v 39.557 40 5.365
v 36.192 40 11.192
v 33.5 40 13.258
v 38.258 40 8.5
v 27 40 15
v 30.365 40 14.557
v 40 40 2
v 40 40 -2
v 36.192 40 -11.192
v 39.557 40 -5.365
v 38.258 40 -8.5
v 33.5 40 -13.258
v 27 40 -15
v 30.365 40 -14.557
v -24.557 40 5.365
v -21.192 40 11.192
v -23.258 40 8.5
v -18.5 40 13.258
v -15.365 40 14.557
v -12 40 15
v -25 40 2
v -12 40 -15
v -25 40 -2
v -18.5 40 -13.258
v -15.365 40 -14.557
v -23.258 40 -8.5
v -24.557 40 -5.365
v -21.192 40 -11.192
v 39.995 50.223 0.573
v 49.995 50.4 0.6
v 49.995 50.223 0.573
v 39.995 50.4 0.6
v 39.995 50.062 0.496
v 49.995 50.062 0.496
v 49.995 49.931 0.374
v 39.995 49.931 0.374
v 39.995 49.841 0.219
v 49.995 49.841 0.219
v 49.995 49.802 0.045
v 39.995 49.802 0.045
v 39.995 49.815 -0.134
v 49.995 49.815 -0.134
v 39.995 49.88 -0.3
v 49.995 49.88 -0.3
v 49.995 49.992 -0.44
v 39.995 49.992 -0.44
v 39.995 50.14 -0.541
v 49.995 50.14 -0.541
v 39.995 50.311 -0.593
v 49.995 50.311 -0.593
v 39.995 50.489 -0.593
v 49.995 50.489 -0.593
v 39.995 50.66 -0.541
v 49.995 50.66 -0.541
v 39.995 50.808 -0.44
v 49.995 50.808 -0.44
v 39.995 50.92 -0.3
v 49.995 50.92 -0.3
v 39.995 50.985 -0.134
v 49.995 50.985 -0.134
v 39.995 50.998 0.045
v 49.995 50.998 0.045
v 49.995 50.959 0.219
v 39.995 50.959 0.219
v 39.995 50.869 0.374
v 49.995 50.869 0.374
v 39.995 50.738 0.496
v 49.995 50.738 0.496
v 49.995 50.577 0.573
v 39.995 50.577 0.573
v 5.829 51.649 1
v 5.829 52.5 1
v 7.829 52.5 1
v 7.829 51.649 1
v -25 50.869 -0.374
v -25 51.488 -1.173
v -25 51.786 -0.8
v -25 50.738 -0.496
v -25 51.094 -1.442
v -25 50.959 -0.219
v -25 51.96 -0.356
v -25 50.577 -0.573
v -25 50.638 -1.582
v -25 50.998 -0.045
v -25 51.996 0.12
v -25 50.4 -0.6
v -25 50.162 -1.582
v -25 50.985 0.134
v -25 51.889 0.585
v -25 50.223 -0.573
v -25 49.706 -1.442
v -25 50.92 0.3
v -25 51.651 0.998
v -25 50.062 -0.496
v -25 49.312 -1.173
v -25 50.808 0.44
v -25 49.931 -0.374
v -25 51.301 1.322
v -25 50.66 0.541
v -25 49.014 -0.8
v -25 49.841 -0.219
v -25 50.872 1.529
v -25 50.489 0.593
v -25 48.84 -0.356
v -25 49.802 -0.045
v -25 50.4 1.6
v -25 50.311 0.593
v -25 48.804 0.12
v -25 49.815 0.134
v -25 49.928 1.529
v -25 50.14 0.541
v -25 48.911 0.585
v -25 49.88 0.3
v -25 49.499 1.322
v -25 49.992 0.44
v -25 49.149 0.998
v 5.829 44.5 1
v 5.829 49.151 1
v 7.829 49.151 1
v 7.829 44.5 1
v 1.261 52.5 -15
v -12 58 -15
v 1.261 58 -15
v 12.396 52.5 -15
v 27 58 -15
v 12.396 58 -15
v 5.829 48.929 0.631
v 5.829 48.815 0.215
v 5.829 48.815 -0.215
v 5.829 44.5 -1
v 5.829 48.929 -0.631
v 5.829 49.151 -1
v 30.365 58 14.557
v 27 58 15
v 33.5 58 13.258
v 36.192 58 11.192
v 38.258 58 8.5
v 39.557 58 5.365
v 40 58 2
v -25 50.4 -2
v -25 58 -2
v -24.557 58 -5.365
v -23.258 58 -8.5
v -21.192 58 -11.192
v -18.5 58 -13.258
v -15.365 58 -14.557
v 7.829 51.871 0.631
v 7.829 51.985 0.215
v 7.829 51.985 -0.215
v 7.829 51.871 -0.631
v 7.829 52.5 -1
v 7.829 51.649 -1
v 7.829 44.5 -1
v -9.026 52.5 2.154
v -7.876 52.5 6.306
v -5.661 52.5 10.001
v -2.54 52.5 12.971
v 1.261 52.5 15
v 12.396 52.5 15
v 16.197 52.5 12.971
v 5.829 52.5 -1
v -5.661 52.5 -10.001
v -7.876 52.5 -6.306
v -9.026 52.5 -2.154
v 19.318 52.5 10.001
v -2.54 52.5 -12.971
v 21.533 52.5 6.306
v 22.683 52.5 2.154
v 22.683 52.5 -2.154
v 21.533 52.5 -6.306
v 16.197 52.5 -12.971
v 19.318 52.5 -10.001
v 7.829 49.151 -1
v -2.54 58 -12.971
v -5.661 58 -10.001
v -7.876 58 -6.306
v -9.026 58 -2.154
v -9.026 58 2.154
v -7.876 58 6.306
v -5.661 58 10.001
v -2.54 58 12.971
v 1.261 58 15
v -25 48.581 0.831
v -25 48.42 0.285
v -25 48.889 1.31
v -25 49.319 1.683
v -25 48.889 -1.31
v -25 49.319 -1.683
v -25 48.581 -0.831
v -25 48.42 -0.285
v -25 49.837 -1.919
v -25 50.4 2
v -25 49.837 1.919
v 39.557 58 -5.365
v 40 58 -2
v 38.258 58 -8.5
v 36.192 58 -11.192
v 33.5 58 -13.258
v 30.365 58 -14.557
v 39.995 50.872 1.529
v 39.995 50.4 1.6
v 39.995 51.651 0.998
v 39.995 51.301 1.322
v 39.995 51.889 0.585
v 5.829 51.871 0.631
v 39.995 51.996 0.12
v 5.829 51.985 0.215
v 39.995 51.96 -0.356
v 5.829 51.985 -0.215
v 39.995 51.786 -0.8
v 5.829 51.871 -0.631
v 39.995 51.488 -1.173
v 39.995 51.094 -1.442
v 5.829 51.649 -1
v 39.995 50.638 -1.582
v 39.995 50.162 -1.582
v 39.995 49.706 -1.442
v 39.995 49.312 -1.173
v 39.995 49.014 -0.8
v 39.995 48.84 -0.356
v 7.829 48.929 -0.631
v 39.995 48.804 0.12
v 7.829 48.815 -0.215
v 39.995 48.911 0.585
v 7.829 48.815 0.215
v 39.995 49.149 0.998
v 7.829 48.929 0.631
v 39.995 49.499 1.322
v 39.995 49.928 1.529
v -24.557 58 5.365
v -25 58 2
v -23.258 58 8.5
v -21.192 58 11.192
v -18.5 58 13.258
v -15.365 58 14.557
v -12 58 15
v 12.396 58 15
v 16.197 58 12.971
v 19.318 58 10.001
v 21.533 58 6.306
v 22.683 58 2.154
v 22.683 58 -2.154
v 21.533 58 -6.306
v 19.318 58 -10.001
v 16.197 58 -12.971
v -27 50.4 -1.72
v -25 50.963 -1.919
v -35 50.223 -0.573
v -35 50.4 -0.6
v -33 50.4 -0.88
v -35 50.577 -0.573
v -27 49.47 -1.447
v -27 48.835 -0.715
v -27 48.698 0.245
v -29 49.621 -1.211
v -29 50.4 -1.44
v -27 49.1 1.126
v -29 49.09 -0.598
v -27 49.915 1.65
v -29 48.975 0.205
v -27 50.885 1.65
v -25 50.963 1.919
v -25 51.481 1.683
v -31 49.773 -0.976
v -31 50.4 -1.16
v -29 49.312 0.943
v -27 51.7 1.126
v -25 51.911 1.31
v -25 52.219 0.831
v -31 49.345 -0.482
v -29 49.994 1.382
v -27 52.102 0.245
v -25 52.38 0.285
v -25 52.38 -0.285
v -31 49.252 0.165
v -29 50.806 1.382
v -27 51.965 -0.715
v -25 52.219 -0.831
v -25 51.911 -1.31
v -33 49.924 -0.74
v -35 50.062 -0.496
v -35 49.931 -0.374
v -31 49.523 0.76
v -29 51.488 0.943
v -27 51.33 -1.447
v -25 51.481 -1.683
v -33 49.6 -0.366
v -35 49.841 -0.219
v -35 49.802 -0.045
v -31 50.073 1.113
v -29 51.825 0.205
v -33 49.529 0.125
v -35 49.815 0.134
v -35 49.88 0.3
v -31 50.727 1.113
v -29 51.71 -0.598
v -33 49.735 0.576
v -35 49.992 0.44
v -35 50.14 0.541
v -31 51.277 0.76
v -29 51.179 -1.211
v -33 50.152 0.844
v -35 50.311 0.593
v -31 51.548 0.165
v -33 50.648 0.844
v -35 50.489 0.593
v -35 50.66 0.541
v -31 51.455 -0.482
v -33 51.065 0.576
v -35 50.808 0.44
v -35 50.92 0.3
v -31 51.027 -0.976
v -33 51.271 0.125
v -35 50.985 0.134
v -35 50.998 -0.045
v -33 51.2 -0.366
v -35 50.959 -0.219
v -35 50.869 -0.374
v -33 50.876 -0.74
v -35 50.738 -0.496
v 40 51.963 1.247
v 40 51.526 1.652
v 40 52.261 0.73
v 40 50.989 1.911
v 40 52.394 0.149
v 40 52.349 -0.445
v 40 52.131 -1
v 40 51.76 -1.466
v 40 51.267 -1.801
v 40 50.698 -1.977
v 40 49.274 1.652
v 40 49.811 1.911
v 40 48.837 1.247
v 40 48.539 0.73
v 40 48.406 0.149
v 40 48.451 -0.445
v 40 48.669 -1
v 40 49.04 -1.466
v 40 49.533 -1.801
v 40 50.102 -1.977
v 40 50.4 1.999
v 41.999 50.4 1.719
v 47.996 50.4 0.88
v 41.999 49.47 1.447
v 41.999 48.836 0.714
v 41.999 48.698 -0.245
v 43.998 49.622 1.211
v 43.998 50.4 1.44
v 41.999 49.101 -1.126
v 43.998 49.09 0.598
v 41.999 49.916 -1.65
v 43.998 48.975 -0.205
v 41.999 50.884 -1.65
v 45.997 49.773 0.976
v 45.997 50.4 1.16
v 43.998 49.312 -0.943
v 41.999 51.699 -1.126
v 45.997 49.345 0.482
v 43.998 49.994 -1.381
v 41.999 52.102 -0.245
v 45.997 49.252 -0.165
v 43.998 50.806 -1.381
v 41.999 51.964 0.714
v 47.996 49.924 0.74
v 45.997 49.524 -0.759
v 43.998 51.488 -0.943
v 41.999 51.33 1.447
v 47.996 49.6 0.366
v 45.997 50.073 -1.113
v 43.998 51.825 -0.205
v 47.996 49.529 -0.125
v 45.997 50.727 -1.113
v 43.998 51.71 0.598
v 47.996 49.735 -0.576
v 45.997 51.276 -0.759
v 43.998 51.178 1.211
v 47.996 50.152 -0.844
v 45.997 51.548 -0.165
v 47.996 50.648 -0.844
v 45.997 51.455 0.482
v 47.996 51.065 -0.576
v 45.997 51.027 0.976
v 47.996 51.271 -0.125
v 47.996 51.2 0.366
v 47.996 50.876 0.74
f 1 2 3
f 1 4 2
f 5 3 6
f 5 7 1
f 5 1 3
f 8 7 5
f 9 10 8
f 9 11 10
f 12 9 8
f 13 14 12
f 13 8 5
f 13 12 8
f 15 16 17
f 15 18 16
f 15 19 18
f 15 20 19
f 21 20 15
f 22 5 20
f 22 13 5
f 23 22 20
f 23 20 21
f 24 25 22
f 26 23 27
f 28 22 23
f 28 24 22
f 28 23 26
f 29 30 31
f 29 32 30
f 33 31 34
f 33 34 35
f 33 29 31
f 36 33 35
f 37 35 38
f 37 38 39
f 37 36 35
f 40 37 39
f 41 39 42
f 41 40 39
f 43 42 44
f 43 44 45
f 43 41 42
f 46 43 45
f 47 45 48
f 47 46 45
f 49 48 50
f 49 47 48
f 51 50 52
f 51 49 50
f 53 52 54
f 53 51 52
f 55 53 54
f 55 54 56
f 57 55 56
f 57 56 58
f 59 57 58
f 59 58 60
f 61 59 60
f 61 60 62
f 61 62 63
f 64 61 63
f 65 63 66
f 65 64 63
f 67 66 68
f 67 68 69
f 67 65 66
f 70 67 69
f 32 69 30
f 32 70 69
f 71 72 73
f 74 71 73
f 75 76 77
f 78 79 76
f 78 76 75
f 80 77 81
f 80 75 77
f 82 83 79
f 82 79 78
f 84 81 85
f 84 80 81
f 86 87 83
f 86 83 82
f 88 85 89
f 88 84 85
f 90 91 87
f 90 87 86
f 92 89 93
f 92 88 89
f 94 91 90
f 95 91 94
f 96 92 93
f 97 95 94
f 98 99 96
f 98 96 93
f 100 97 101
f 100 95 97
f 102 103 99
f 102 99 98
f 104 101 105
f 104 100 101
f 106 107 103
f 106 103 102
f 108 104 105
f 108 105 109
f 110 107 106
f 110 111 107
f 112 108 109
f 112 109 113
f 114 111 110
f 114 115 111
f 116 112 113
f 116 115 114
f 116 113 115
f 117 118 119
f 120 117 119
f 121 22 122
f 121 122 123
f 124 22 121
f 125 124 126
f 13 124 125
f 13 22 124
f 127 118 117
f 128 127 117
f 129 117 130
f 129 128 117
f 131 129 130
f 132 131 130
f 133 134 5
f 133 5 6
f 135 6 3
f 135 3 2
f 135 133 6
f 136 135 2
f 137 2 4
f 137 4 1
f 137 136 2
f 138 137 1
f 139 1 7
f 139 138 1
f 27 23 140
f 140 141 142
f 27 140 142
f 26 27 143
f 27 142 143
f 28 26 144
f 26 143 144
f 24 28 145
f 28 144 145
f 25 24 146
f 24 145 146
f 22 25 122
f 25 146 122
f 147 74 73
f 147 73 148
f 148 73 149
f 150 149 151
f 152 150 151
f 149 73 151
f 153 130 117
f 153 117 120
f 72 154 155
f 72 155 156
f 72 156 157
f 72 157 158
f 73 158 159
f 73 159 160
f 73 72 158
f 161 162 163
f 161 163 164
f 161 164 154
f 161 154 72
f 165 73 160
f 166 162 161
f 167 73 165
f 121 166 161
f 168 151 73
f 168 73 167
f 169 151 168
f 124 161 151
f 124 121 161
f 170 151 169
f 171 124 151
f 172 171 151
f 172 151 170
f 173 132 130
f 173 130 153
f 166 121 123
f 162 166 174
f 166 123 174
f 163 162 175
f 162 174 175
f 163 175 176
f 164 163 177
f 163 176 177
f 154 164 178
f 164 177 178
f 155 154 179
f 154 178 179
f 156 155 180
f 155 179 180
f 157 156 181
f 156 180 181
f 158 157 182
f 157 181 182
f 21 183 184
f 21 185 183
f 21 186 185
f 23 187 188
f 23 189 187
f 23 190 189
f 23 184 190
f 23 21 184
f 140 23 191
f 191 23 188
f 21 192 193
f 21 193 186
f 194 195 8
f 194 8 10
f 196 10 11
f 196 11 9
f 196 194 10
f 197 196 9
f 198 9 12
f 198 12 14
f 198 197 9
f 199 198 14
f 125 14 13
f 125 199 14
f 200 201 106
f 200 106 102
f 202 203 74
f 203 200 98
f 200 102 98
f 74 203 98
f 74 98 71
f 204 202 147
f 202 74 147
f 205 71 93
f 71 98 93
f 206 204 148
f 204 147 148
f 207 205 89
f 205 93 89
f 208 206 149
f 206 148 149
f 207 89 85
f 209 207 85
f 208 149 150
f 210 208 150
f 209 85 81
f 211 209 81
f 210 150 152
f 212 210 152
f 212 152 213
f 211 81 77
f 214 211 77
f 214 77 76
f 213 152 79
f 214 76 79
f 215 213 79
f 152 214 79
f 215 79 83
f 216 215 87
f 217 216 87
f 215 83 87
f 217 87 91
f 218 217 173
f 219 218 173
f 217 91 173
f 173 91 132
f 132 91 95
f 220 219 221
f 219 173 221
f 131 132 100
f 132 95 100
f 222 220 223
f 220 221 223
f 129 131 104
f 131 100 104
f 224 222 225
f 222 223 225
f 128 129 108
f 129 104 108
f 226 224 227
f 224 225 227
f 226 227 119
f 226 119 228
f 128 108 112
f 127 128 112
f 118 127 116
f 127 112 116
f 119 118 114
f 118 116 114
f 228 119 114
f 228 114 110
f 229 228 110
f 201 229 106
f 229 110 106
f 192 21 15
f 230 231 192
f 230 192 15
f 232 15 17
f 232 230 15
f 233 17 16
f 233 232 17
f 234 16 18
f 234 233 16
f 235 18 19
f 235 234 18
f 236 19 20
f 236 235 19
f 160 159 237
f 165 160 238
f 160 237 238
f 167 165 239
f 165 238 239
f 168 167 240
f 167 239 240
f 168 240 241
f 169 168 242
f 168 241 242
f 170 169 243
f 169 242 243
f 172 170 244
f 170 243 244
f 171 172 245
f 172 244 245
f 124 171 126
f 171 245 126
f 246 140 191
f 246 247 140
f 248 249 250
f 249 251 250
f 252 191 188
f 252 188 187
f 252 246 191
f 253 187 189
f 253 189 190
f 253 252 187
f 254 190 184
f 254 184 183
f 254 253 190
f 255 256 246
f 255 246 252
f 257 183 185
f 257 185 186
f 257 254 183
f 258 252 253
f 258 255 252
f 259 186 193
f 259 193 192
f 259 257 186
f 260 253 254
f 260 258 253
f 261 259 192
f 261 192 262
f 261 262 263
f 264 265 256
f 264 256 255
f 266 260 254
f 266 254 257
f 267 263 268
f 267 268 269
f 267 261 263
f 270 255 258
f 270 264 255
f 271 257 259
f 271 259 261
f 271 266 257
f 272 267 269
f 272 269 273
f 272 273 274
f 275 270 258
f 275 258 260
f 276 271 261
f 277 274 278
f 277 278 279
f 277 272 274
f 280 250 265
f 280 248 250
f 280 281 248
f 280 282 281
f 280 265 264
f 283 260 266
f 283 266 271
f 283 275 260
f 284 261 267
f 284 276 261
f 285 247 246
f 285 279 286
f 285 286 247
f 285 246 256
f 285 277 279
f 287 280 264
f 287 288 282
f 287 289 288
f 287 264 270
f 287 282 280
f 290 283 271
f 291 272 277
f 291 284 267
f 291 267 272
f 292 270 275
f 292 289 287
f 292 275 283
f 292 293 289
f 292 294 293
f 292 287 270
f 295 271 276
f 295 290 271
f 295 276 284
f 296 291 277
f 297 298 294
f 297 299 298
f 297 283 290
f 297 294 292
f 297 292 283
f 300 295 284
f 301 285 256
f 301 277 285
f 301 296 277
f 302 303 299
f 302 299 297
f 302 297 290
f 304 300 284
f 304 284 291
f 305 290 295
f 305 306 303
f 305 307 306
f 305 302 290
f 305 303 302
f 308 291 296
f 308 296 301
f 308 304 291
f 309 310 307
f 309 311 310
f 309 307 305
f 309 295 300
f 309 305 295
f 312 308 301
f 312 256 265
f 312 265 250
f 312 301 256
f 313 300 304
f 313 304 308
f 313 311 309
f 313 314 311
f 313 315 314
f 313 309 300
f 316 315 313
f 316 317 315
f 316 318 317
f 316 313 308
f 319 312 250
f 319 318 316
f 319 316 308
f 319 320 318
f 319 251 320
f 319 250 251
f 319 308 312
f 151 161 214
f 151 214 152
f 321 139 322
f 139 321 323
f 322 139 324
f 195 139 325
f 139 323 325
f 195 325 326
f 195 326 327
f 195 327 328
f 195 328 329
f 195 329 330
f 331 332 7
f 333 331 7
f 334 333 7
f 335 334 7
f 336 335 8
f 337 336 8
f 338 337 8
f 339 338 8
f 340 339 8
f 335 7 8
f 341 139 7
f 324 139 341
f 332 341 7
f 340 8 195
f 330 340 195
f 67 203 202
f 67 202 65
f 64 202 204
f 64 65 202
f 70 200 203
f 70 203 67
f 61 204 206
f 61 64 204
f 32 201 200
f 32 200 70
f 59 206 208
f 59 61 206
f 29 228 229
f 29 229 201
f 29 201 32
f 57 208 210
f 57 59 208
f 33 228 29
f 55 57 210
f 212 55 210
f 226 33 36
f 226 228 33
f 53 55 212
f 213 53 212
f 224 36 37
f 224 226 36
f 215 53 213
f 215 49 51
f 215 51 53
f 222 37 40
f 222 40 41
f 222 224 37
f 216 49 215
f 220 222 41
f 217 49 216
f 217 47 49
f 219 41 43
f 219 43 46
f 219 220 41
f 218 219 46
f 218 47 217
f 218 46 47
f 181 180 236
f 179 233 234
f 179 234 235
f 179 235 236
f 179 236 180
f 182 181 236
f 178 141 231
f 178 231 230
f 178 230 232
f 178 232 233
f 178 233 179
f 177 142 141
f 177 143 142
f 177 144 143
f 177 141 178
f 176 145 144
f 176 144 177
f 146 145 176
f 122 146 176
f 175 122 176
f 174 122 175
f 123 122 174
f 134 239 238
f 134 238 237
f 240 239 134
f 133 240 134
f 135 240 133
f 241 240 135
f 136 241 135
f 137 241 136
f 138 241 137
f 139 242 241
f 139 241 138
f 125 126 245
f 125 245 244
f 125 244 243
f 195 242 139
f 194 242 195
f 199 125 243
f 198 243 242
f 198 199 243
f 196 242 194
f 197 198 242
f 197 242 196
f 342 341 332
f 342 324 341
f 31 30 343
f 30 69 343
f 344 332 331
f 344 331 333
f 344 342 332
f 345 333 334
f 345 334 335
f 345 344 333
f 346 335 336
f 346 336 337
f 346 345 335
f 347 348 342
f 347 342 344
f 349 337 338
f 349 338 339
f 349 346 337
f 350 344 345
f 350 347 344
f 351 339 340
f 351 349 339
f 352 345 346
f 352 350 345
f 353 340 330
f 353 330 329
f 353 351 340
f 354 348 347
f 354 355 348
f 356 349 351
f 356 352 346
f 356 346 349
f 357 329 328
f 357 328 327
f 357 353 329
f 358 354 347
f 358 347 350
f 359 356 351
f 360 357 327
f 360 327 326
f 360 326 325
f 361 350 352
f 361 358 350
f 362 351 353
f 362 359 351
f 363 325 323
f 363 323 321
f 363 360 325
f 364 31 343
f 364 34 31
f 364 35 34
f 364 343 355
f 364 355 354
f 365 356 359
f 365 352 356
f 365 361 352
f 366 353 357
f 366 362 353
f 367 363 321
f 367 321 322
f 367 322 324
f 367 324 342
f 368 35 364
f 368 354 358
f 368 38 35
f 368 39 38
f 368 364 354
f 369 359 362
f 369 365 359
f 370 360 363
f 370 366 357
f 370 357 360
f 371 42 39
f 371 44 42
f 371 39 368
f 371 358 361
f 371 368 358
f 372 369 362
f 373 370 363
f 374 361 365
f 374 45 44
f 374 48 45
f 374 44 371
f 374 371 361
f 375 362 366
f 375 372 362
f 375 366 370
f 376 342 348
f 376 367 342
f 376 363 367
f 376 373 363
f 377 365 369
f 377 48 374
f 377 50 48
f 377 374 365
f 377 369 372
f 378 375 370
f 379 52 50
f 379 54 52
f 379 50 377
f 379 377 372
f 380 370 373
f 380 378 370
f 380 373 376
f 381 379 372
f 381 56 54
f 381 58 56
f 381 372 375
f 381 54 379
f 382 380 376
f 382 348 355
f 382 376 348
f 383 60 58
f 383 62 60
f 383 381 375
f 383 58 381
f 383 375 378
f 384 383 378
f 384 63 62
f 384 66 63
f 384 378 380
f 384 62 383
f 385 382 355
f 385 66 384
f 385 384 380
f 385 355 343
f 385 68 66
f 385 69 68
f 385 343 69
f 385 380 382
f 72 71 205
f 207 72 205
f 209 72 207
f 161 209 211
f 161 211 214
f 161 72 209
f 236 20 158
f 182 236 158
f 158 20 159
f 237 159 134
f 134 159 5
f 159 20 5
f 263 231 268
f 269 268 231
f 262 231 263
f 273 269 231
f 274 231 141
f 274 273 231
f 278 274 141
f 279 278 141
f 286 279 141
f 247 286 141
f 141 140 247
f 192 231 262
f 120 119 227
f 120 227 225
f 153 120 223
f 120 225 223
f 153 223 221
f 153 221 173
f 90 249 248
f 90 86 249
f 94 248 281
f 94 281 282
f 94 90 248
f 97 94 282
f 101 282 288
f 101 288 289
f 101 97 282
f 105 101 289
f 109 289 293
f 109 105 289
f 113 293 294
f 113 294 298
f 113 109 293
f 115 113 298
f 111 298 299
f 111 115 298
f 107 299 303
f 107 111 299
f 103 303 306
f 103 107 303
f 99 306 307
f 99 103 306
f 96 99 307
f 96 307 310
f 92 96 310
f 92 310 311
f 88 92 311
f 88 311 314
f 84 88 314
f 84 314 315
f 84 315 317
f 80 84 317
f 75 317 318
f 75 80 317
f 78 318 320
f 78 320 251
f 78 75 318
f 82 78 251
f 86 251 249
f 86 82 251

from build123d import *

# Parameters (mm, degrees)
SKETCH1_W           = 65
SKETCH1_H           = 30
BOSS_EXTRUDE1_DEPTH = 58
FILLET1_R           = 13
SKETCH15_W          = 83.696095513
SKETCH15_H          = 31.69844841
CUT_EXTRUDE7_DEPTH  = 50
SKETCH18_R          = 16
CUT_EXTRUDE10_DEPTH = 5.5
CUT_EXTRUDE12_REACH = 90.397
SKETCH3_R           = 1.6
SKETCH21_W          = 2
SKETCH21_H          = 2
CUT_EXTRUDE13_DEPTH = 8


with BuildPart() as part:
    # Sketch1 → Boss-Extrude1 (new body)
    with BuildSketch(Plane(origin=(0, 0, 0), x_dir=(1, 0, 0), z_dir=(0, 1, 0))):
        with Locations((7.5, 0)):
            Rectangle(SKETCH1_W, SKETCH1_H)
    extrude(amount=BOSS_EXTRUDE1_DEPTH)

    # Fillet1
    fillet1_edges = [part.edges().sort_by_distance(p)[0] for p in [
        (40, 29, 15),
        (-25, 29, 15),
        (-25, 29, -15),
        (40, 29, -15),
    ]]
    fillet(fillet1_edges, radius=FILLET1_R)

    # Sketch15 → Cut-Extrude7 (cut)
    with BuildSketch(Plane(origin=(0, -10, 0), x_dir=(-1, 0, 0), z_dir=(0, -1, 0))):
        with Locations((-0.057440767, 0.030479277)):
            Rectangle(SKETCH15_W, SKETCH15_H)
    extrude(amount=-CUT_EXTRUDE7_DEPTH, mode=Mode.SUBTRACT)

    # Sketch18 → Cut-Extrude10 (cut)
    with BuildSketch(Plane(origin=(0, 58, 0), x_dir=(1, 0, 0), z_dir=(0, 1, 0))):
        with Locations((6.828508286, 0)):
            Circle(SKETCH18_R)
    extrude(amount=-CUT_EXTRUDE10_DEPTH, mode=Mode.SUBTRACT)

    # Sketch3 → Cut-Extrude12 (cut, up to next)
    with BuildSketch(Plane.ZY.offset(25), mode=Mode.PRIVATE) as cut_extrude12_sk1:
        with Locations((0, 50.4)):
            Circle(SKETCH3_R)
    cut_extrude12_tool1 = extrude(cut_extrude12_sk1.sketch, amount=-CUT_EXTRUDE12_REACH, mode=Mode.PRIVATE) & part.part
    add(cut_extrude12_tool1.solids().sort_by_distance((-25, 50.4, 0))[0], mode=Mode.SUBTRACT)

    # Sketch21 → Cut-Extrude13 (cut)
    with BuildSketch(Plane(origin=(0, 52.5, 0), x_dir=(1, 0, 0), z_dir=(0, 1, 0))):
        with Locations((6.828508286, 0)):
            Rectangle(SKETCH21_W, SKETCH21_H)
    extrude(amount=-CUT_EXTRUDE13_DEPTH, mode=Mode.SUBTRACT)

    # Sketch24 → Revolve1 (revolve)
    with BuildSketch(Plane.XY, mode=Mode.PRIVATE) as revolve1_sk:
        Polygon((-25, 51), (-25, 52.4), (-35, 51), align=None)
    revolve(revolve1_sk.sketch.rotate(Axis((-25, 50.4, 0), (-1, 0, 0)), 90), axis=Axis((-25, 50.4, 0), (-1, 0, 0)))

    # Sketch25 → Revolve2 (revolve)
    with BuildSketch(Plane.XY, mode=Mode.PRIVATE) as revolve2_sk:
        Polygon((39.995235715, 52.4), (49.995235715, 51), (39.995235715, 51), align=None)
    revolve(revolve2_sk.sketch.rotate(Axis((-25, 50.4, 0), (1, 0, 0)), 90), axis=Axis((-25, 50.4, 0), (1, 0, 0)))


solid = part.part
